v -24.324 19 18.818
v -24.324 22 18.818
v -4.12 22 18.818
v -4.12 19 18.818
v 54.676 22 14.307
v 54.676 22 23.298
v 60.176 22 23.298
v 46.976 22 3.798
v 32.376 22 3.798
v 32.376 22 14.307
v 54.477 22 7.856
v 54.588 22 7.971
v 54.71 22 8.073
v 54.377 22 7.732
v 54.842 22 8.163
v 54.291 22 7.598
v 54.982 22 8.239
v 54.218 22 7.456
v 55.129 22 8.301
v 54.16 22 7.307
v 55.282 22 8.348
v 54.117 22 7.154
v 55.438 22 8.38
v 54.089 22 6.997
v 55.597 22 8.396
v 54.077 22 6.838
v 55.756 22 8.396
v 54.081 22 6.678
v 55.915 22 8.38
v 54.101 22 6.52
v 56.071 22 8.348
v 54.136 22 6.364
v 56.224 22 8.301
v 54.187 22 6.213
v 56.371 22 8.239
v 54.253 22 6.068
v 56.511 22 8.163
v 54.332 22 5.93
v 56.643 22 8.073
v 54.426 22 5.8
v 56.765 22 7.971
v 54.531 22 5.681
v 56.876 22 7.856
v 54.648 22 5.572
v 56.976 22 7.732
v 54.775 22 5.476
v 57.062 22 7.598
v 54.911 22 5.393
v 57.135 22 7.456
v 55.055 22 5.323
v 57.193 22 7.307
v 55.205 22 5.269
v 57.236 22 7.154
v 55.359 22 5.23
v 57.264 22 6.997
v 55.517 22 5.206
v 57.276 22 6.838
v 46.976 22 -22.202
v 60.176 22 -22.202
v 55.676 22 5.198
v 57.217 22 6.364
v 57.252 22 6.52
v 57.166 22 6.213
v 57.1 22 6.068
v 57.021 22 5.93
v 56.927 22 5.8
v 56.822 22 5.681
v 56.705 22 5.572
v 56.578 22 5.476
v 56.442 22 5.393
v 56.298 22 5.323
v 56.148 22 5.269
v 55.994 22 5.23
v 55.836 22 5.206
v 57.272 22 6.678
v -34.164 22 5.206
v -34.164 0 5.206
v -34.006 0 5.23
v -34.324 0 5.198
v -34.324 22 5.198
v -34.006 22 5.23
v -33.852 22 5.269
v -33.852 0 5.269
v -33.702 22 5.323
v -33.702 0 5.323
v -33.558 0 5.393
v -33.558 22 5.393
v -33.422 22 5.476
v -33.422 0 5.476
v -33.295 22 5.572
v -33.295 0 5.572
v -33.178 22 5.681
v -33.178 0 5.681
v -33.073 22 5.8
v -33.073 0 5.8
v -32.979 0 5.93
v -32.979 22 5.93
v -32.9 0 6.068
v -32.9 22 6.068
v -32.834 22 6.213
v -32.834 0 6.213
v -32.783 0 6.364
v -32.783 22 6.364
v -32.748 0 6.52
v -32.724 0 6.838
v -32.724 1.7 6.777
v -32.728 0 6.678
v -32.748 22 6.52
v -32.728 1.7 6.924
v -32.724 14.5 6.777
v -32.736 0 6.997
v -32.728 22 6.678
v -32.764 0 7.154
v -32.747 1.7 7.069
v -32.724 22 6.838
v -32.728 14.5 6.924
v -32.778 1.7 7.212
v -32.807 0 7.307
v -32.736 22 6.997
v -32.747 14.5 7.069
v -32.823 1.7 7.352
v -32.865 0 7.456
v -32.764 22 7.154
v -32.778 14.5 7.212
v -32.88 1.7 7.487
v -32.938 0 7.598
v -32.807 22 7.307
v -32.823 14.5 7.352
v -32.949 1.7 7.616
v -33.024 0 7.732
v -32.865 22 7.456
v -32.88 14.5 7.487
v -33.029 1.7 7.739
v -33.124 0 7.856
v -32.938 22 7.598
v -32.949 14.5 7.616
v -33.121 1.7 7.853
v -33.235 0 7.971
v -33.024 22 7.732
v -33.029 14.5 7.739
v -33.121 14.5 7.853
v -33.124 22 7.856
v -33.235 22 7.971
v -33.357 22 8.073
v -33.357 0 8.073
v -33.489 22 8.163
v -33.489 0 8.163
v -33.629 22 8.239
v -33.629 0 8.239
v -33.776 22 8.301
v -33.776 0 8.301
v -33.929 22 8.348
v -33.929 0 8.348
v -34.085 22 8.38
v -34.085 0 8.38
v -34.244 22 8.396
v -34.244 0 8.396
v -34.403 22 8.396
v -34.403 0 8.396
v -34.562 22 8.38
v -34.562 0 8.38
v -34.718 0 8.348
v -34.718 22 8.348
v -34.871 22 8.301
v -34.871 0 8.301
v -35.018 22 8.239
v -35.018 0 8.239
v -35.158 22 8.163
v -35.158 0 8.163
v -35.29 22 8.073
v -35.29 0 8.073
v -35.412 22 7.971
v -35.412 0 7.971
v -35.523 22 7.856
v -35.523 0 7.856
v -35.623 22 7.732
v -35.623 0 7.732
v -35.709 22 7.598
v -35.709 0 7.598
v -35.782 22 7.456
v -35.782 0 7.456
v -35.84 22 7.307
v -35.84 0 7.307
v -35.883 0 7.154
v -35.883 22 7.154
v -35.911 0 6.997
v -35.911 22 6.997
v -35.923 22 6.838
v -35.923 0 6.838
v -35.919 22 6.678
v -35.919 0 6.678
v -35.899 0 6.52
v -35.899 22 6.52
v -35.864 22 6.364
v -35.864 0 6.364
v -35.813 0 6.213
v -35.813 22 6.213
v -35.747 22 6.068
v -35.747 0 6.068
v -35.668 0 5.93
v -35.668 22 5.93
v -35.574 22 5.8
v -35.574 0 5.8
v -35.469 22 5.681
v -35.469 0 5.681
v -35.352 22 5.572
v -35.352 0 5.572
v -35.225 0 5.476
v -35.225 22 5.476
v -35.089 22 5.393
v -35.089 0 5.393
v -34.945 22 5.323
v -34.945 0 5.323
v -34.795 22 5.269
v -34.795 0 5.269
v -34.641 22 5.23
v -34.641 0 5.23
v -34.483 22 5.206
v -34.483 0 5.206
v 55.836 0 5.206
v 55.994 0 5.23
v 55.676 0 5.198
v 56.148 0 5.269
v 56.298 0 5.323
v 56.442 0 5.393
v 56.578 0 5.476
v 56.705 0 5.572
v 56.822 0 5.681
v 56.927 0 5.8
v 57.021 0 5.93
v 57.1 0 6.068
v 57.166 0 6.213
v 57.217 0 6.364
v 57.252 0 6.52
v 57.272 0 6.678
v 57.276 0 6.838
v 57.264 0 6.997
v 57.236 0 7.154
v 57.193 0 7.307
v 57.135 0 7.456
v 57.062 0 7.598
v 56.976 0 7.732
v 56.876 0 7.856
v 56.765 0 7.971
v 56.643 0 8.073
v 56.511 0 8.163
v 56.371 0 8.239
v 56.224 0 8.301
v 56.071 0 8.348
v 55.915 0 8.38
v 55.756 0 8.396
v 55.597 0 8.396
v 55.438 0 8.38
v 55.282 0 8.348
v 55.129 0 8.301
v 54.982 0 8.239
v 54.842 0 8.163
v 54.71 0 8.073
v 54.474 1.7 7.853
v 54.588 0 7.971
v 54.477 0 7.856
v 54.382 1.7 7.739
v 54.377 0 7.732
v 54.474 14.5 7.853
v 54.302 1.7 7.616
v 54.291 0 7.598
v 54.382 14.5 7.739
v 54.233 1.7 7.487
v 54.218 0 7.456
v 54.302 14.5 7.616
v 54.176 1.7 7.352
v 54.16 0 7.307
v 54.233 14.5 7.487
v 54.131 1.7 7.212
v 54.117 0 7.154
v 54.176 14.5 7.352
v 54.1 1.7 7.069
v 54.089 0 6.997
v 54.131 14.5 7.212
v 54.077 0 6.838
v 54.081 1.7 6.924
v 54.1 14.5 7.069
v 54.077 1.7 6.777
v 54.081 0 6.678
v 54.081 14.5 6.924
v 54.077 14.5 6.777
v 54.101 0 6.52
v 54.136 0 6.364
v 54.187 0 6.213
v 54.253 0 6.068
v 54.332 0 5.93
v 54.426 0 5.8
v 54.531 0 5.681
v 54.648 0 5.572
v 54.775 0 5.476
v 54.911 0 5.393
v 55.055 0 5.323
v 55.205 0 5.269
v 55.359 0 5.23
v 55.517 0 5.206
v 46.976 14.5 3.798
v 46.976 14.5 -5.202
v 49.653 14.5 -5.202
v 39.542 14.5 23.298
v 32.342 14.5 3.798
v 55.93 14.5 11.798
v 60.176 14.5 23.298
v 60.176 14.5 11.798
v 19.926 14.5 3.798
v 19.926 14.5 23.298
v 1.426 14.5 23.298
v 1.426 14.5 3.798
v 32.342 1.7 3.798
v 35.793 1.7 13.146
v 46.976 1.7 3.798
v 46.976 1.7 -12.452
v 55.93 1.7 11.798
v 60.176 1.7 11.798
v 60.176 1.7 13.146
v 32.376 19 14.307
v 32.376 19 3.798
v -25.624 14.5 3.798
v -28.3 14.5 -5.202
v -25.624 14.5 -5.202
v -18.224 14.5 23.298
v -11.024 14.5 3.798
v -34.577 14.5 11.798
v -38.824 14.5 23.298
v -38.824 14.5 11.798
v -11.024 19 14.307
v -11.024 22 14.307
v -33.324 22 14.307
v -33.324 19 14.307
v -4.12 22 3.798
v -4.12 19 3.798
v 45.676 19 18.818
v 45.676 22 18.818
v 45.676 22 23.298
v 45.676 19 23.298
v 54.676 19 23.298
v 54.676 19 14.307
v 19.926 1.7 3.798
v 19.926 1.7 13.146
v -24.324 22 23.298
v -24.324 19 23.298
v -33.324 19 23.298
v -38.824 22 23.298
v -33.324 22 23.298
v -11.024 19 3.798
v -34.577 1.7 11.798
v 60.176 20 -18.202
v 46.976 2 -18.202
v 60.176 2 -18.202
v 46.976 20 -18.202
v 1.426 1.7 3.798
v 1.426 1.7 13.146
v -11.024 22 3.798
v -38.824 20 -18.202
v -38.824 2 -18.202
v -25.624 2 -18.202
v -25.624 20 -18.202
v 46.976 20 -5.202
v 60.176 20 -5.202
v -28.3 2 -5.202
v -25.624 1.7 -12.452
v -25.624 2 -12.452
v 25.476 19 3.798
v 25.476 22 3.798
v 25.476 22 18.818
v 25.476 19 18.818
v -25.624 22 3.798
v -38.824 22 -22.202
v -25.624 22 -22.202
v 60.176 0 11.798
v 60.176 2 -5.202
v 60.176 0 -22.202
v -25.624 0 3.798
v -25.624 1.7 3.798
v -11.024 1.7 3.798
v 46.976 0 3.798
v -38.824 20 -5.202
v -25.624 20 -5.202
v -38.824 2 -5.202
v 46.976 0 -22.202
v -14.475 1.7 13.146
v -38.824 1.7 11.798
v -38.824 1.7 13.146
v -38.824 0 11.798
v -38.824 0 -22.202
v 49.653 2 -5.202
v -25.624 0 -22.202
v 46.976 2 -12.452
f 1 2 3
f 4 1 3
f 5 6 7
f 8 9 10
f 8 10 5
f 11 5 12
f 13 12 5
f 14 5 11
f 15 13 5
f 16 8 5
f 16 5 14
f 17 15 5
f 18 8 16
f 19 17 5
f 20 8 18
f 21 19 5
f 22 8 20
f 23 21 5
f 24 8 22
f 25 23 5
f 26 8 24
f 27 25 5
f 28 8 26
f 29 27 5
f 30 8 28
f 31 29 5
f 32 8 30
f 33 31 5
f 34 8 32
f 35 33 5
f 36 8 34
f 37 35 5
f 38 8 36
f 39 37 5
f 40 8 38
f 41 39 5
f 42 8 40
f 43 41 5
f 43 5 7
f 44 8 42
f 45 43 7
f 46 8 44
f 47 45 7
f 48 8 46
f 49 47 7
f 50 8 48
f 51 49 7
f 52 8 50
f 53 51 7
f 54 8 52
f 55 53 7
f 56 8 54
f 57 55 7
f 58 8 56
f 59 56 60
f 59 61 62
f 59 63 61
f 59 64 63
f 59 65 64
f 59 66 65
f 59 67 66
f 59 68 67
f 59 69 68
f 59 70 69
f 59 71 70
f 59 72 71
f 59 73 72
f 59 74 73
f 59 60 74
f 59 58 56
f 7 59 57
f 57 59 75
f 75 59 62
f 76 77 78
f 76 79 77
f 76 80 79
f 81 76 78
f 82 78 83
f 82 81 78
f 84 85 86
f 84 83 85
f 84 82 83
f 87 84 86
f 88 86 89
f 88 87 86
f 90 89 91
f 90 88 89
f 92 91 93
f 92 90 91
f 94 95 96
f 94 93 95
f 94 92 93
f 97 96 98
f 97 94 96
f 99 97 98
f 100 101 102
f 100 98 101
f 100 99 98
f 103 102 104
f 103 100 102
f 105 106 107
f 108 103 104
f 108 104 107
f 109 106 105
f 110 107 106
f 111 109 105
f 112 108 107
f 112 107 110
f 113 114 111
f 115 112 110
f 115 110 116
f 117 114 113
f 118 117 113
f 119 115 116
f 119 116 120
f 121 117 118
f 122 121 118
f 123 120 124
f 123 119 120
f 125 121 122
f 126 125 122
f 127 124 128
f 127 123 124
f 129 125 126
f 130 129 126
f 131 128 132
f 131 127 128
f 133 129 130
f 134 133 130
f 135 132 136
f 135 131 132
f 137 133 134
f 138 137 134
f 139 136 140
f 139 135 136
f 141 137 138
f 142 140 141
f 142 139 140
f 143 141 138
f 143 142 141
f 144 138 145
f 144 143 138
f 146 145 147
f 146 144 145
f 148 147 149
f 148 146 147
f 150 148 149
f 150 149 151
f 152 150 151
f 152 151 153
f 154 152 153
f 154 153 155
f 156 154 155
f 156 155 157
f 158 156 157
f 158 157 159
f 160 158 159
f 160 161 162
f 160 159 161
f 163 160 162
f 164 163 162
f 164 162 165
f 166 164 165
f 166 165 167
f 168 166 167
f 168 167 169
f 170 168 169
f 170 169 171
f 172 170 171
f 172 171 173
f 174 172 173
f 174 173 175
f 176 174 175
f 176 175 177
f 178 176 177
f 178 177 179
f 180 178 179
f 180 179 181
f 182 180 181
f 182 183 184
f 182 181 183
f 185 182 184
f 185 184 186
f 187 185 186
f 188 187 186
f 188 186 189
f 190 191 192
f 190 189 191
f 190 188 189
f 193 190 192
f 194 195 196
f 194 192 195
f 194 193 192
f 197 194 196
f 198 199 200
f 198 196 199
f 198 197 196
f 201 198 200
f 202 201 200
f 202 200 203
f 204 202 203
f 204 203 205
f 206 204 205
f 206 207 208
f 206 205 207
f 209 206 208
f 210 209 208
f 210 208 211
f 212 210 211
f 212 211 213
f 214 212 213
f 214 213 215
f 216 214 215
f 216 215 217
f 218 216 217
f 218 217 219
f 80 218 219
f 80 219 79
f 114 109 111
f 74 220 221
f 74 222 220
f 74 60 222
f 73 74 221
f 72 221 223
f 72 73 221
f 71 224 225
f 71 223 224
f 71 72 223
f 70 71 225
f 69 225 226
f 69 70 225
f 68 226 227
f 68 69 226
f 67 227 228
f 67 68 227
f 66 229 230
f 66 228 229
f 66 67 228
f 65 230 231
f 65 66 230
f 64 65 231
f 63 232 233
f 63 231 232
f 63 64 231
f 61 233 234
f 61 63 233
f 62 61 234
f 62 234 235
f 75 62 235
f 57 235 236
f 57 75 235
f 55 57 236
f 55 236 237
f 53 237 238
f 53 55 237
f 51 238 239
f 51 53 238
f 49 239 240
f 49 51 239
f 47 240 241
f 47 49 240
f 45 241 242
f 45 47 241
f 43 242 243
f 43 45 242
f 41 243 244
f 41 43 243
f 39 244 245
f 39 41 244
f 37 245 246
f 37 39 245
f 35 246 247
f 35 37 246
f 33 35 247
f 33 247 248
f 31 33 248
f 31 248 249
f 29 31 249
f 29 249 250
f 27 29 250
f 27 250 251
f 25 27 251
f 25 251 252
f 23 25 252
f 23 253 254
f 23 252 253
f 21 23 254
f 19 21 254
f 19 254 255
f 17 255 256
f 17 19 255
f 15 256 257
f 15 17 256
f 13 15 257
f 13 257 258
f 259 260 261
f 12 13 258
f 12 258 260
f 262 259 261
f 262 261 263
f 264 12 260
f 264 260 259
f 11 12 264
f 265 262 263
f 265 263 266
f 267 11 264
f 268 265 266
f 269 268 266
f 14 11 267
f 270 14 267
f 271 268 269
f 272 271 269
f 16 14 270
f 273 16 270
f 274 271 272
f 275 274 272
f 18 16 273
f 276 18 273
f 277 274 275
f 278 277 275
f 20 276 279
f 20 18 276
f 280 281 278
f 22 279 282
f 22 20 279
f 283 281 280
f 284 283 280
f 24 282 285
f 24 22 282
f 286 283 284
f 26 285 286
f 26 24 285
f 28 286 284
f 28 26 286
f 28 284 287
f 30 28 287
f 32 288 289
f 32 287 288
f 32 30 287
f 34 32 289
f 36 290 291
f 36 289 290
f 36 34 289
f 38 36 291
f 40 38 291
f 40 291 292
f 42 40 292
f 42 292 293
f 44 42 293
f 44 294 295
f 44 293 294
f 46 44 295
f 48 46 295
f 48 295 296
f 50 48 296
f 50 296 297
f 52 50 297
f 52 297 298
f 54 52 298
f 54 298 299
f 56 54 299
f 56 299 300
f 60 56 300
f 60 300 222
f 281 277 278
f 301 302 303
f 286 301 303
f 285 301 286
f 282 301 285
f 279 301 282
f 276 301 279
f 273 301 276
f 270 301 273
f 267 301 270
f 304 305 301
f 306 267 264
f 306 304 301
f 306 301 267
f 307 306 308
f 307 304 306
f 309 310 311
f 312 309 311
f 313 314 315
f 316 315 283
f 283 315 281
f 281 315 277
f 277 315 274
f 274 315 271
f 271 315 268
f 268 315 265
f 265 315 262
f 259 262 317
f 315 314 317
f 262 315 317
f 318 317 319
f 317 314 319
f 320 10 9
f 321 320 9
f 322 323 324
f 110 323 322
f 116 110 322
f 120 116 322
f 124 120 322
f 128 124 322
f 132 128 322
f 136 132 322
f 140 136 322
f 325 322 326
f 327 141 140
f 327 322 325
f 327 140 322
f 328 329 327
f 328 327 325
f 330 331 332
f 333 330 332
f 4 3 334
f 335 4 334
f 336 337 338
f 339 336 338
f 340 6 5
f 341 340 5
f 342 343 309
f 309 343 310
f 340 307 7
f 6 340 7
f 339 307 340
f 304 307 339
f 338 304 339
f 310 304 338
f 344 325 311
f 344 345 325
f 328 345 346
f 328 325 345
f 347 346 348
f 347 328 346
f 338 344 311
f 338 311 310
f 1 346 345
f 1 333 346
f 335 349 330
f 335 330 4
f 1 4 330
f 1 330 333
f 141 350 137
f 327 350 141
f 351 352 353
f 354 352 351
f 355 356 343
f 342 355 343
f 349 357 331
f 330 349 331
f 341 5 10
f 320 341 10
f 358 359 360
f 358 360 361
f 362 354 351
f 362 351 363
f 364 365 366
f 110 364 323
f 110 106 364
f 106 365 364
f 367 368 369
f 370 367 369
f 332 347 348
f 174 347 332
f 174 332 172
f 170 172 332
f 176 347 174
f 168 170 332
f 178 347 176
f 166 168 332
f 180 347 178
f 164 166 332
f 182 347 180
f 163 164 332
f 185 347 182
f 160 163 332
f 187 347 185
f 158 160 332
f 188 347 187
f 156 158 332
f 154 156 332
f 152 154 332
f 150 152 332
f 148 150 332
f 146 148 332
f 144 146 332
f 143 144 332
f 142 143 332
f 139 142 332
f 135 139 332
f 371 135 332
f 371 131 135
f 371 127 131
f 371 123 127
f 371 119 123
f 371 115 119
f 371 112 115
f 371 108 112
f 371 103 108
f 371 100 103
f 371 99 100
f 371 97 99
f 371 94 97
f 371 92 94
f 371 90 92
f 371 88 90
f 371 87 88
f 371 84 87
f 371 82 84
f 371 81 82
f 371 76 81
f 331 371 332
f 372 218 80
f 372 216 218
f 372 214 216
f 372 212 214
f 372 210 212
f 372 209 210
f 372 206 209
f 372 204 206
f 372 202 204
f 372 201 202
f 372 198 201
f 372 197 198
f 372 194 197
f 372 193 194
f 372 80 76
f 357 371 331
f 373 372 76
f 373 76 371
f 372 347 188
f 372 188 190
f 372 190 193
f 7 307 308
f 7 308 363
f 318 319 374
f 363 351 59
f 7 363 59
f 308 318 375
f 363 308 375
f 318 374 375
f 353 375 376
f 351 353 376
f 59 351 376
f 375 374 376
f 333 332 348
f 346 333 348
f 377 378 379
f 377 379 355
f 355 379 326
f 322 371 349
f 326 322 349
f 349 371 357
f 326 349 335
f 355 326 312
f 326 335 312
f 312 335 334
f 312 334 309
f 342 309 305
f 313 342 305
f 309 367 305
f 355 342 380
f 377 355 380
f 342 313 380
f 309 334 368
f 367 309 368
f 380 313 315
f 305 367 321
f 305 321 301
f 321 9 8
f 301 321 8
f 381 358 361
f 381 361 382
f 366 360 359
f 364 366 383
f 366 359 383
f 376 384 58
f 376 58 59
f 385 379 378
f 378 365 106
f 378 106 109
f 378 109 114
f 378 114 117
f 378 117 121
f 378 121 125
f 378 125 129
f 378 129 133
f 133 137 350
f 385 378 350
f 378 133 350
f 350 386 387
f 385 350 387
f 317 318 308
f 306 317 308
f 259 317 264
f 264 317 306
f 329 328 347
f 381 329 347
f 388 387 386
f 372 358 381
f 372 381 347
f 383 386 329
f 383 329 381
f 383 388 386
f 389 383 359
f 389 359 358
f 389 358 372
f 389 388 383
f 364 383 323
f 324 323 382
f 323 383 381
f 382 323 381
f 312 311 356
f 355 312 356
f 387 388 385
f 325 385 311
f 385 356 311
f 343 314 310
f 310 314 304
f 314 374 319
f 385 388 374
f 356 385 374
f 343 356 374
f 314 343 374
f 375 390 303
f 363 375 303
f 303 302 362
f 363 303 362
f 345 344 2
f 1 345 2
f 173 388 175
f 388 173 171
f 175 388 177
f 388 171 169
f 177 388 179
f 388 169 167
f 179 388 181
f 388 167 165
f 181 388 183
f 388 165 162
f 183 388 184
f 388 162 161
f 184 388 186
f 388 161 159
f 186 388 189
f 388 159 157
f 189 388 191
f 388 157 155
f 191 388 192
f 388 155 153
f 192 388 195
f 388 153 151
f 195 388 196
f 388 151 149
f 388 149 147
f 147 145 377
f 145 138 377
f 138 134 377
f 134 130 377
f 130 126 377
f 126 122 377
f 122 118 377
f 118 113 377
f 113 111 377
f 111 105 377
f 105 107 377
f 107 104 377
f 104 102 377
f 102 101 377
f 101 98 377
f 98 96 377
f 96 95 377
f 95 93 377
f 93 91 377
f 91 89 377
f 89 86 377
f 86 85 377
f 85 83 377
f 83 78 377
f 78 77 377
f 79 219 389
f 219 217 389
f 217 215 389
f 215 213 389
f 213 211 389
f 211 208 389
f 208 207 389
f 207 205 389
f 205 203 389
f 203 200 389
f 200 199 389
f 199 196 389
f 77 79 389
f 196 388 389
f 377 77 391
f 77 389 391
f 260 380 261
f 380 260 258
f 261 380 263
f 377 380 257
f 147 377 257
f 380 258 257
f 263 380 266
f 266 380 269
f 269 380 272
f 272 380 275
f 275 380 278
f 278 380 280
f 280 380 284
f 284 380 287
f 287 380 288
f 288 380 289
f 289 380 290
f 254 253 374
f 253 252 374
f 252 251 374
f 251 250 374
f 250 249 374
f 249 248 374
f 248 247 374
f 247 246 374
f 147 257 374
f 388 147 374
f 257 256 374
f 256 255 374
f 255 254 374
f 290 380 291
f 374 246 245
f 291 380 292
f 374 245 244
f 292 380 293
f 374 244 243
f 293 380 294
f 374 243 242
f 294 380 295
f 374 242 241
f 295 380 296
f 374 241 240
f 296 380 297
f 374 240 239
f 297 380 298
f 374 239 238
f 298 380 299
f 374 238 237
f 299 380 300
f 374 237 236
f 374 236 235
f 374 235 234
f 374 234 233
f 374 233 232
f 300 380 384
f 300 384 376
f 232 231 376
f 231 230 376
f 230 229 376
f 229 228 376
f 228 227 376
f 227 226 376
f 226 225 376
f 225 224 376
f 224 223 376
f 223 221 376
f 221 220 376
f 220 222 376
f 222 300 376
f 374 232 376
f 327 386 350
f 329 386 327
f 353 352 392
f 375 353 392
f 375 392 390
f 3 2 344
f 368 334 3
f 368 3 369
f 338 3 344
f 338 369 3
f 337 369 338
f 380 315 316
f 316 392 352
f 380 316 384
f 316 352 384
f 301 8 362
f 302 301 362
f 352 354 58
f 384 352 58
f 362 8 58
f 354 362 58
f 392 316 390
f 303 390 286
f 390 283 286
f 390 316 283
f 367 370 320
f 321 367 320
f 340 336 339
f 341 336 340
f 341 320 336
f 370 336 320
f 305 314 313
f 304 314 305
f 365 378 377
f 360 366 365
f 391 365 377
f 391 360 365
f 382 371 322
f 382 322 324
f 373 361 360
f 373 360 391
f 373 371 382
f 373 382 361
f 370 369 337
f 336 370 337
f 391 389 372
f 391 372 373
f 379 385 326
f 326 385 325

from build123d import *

# Parameters (mm, degrees)
CROQUIS1_W                  = 99
CROQUIS1_H                  = 49
SALIENTE_EXTRUIR1_DEPTH     = 22
CROQUIS2_W                  = 13
CROQUIS2_H                  = 18
CORTAR_EXTRUIR1_DEPTH       = 105.895766214
CROQUIS3_W                  = 3.5
CROQUIS3_H                  = 22
CORTAR_EXTRUIR2_DEPTH       = 105.895766214
CROQUIS4_W                  = 72.6
CROQUIS4_H                  = 26
CORTAR_EXTRUIR3_DEPTH       = 69.17620423
CORTAR_EXTRUIR4_DEPTH       = 79.584079892
CROQUIS7_W                  = 20.634922244
CROQUIS7_H                  = 12.8
CORTAR_EXTRUIR7_DEPTH       = 60
CROQUIS12_W                 = 20.6
CROQUIS12_H                 = 12.8
CORTAR_EXTRUIR8_DEPTH       = 60
CORTAR_EXTRUIR9_DEPTH       = 105.056653851
CORTAR_EXTRUIR9_DEPTH_BACK  = 105.056653851
CROQUIS16_W                 = 11.5
CROQUIS16_H                 = 12.8
CORTAR_EXTRUIR11_DEPTH      = 10
CROQUIS17_W                 = 11.5
CROQUIS17_H                 = 12.8
CORTAR_EXTRUIR12_DEPTH      = 10
CORTAR_EXTRUIR13_DEPTH      = 3
CORTAR_EXTRUIR14_DEPTH      = 69.17620423
CORTAR_EXTRUIR14_DEPTH_BACK = 69.17620423
CROQUIS20_R                 = 1.6


with BuildPart() as part:
    # Croquis1 → Saliente-Extruir1 (new body)
    with BuildSketch(Plane(origin=(0, 0, 0), x_dir=(1, 0, 0), z_dir=(0, 1, 0))):
        with Locations((10.676470588, -2.297794118)):
            Rectangle(CROQUIS1_W, CROQUIS1_H)
    extrude(amount=SALIENTE_EXTRUIR1_DEPTH)

    # Croquis2 → Cortar-Extruir1 (cut, through all)
    with BuildSketch(Plane.ZY.offset(38.823529412)):
        with Locations((-11.702205882, 11)):
            Rectangle(CROQUIS2_W, CROQUIS2_H)
    extrude(amount=-CORTAR_EXTRUIR1_DEPTH, mode=Mode.SUBTRACT)

    # Croquis3 → Cortar-Extruir2 (cut, through all)
    with BuildSketch(Plane.ZY.offset(38.823529412)):
        with Locations((25.047794118, 11)):
            Rectangle(CROQUIS3_W, CROQUIS3_H)
    extrude(amount=-CORTAR_EXTRUIR2_DEPTH, mode=Mode.SUBTRACT)

    # Croquis4 → Cortar-Extruir3 (cut, through all)
    with BuildSketch(Plane(origin=(0, 22, 0), x_dir=(1, 0, 0), z_dir=(0, 1, 0))):
        with Locations((10.676470588, 9.202205882)):
            Rectangle(CROQUIS4_W, CROQUIS4_H)
    extrude(amount=-CORTAR_EXTRUIR3_DEPTH, mode=Mode.SUBTRACT)

    # Croquis6 → Cortar-Extruir4 (cut, through all)
    with BuildSketch(Plane.XY.offset(23.297794118)):
        Polygon((19.926470588, 1.7), (19.926470588, 14.5), (1.426470588, 14.5), (1.426470588, 1.7), (10.676470588, 1.7), align=None)
    extrude(amount=-CORTAR_EXTRUIR4_DEPTH, mode=Mode.SUBTRACT)

    # Croquis7 → Cortar-Extruir7 (cut, along a direction that is not the sketch's normal)
    with BuildSketch(Plane.XY.offset(23.297794118)):
        with Locations((49.859009466, 8.1)):
            Rectangle(CROQUIS7_W, CROQUIS7_H)
    extrude(amount=-CORTAR_EXTRUIR7_DEPTH, dir=(0.346374082759158, 0, 0.9380964741393883), mode=Mode.SUBTRACT)

    # Croquis12 → Cortar-Extruir8 (cut, along a direction that is not the sketch's normal)
    with BuildSketch(Plane.XY.offset(23.297794118)):
        with Locations((-28.523529412, 8.1)):
            Rectangle(CROQUIS12_W, CROQUIS12_H)
    extrude(amount=-CORTAR_EXTRUIR8_DEPTH, dir=(-0.3463740827591596, 0, 0.9380964741393877), mode=Mode.SUBTRACT)

    # Croquis15 → Cortar-Extruir9 (cut, two sides: drawn at the far end of the back side and taken through both)
    with BuildSketch(Plane.ZY.offset(38.823529412).offset(-CORTAR_EXTRUIR9_DEPTH_BACK)):
        Polygon((23.297794118, 0), (11.797794118, 0), (23.297794118, 14.5), align=None)
    extrude(amount=CORTAR_EXTRUIR9_DEPTH + CORTAR_EXTRUIR9_DEPTH_BACK, mode=Mode.SUBTRACT)

    # Croquis16 → Cortar-Extruir11 (cut)
    with BuildSketch(Plane.ZY.offset(38.823529412)):
        with Locations((17.547794118, 8.1)):
            Rectangle(CROQUIS16_W, CROQUIS16_H)
    extrude(amount=-CORTAR_EXTRUIR11_DEPTH, mode=Mode.SUBTRACT)

    # Croquis17 → Cortar-Extruir12 (cut)
    with BuildSketch(Plane(origin=(60.176470588, 0, 0), x_dir=(0, 0, -1), z_dir=(1, 0, 0))):
        with Locations((-17.547794118, 8.1)):
            Rectangle(CROQUIS17_W, CROQUIS17_H)
    extrude(amount=-CORTAR_EXTRUIR12_DEPTH, mode=Mode.SUBTRACT)

    # Croquis18 → Cortar-Extruir13 (cut)
    with BuildSketch(Plane(origin=(0, 22, 0), x_dir=(1, 0, 0), z_dir=(0, 1, 0))):
        Polygon((-33.323529412, -23.297794118), (-24.323529412, -23.297794118), (-24.323529412, -18.818400103), (-4.120464629, -18.818400103), (-4.120464629, -3.797794118), (-11.023529412, -3.797794118), (-11.023529412, -14.307139366), (-33.323529412, -14.307139366), (-33.323529412, -18.818400103), align=None)
        Polygon((45.676470588, -18.818400103), (45.676470588, -23.297794118), (54.676470588, -23.297794118), (54.676470588, -18.818400103), (54.676470588, -14.307139366), (32.376470588, -14.307139366), (32.376470588, -3.797794118), (25.476470588, -3.797794118), (25.476470588, -18.818400103), align=None)
    extrude(amount=-CORTAR_EXTRUIR13_DEPTH, mode=Mode.SUBTRACT)

    # Croquis20 → Cortar-Extruir14 (cut, two sides: drawn at the far end of the back side and taken through both)
    with BuildSketch(Plane.XZ.offset(-CORTAR_EXTRUIR14_DEPTH_BACK)):
        with Locations(Location((-34.323529412, 6.797794118, 0), (0, 0, 270))):
            Circle(CROQUIS20_R)
        with Locations(Location((55.676470588, 6.797794118, 0), (0, 0, 270))):
            Circle(CROQUIS20_R)
    extrude(amount=CORTAR_EXTRUIR14_DEPTH + CORTAR_EXTRUIR14_DEPTH_BACK, mode=Mode.SUBTRACT)


solid = part.part
